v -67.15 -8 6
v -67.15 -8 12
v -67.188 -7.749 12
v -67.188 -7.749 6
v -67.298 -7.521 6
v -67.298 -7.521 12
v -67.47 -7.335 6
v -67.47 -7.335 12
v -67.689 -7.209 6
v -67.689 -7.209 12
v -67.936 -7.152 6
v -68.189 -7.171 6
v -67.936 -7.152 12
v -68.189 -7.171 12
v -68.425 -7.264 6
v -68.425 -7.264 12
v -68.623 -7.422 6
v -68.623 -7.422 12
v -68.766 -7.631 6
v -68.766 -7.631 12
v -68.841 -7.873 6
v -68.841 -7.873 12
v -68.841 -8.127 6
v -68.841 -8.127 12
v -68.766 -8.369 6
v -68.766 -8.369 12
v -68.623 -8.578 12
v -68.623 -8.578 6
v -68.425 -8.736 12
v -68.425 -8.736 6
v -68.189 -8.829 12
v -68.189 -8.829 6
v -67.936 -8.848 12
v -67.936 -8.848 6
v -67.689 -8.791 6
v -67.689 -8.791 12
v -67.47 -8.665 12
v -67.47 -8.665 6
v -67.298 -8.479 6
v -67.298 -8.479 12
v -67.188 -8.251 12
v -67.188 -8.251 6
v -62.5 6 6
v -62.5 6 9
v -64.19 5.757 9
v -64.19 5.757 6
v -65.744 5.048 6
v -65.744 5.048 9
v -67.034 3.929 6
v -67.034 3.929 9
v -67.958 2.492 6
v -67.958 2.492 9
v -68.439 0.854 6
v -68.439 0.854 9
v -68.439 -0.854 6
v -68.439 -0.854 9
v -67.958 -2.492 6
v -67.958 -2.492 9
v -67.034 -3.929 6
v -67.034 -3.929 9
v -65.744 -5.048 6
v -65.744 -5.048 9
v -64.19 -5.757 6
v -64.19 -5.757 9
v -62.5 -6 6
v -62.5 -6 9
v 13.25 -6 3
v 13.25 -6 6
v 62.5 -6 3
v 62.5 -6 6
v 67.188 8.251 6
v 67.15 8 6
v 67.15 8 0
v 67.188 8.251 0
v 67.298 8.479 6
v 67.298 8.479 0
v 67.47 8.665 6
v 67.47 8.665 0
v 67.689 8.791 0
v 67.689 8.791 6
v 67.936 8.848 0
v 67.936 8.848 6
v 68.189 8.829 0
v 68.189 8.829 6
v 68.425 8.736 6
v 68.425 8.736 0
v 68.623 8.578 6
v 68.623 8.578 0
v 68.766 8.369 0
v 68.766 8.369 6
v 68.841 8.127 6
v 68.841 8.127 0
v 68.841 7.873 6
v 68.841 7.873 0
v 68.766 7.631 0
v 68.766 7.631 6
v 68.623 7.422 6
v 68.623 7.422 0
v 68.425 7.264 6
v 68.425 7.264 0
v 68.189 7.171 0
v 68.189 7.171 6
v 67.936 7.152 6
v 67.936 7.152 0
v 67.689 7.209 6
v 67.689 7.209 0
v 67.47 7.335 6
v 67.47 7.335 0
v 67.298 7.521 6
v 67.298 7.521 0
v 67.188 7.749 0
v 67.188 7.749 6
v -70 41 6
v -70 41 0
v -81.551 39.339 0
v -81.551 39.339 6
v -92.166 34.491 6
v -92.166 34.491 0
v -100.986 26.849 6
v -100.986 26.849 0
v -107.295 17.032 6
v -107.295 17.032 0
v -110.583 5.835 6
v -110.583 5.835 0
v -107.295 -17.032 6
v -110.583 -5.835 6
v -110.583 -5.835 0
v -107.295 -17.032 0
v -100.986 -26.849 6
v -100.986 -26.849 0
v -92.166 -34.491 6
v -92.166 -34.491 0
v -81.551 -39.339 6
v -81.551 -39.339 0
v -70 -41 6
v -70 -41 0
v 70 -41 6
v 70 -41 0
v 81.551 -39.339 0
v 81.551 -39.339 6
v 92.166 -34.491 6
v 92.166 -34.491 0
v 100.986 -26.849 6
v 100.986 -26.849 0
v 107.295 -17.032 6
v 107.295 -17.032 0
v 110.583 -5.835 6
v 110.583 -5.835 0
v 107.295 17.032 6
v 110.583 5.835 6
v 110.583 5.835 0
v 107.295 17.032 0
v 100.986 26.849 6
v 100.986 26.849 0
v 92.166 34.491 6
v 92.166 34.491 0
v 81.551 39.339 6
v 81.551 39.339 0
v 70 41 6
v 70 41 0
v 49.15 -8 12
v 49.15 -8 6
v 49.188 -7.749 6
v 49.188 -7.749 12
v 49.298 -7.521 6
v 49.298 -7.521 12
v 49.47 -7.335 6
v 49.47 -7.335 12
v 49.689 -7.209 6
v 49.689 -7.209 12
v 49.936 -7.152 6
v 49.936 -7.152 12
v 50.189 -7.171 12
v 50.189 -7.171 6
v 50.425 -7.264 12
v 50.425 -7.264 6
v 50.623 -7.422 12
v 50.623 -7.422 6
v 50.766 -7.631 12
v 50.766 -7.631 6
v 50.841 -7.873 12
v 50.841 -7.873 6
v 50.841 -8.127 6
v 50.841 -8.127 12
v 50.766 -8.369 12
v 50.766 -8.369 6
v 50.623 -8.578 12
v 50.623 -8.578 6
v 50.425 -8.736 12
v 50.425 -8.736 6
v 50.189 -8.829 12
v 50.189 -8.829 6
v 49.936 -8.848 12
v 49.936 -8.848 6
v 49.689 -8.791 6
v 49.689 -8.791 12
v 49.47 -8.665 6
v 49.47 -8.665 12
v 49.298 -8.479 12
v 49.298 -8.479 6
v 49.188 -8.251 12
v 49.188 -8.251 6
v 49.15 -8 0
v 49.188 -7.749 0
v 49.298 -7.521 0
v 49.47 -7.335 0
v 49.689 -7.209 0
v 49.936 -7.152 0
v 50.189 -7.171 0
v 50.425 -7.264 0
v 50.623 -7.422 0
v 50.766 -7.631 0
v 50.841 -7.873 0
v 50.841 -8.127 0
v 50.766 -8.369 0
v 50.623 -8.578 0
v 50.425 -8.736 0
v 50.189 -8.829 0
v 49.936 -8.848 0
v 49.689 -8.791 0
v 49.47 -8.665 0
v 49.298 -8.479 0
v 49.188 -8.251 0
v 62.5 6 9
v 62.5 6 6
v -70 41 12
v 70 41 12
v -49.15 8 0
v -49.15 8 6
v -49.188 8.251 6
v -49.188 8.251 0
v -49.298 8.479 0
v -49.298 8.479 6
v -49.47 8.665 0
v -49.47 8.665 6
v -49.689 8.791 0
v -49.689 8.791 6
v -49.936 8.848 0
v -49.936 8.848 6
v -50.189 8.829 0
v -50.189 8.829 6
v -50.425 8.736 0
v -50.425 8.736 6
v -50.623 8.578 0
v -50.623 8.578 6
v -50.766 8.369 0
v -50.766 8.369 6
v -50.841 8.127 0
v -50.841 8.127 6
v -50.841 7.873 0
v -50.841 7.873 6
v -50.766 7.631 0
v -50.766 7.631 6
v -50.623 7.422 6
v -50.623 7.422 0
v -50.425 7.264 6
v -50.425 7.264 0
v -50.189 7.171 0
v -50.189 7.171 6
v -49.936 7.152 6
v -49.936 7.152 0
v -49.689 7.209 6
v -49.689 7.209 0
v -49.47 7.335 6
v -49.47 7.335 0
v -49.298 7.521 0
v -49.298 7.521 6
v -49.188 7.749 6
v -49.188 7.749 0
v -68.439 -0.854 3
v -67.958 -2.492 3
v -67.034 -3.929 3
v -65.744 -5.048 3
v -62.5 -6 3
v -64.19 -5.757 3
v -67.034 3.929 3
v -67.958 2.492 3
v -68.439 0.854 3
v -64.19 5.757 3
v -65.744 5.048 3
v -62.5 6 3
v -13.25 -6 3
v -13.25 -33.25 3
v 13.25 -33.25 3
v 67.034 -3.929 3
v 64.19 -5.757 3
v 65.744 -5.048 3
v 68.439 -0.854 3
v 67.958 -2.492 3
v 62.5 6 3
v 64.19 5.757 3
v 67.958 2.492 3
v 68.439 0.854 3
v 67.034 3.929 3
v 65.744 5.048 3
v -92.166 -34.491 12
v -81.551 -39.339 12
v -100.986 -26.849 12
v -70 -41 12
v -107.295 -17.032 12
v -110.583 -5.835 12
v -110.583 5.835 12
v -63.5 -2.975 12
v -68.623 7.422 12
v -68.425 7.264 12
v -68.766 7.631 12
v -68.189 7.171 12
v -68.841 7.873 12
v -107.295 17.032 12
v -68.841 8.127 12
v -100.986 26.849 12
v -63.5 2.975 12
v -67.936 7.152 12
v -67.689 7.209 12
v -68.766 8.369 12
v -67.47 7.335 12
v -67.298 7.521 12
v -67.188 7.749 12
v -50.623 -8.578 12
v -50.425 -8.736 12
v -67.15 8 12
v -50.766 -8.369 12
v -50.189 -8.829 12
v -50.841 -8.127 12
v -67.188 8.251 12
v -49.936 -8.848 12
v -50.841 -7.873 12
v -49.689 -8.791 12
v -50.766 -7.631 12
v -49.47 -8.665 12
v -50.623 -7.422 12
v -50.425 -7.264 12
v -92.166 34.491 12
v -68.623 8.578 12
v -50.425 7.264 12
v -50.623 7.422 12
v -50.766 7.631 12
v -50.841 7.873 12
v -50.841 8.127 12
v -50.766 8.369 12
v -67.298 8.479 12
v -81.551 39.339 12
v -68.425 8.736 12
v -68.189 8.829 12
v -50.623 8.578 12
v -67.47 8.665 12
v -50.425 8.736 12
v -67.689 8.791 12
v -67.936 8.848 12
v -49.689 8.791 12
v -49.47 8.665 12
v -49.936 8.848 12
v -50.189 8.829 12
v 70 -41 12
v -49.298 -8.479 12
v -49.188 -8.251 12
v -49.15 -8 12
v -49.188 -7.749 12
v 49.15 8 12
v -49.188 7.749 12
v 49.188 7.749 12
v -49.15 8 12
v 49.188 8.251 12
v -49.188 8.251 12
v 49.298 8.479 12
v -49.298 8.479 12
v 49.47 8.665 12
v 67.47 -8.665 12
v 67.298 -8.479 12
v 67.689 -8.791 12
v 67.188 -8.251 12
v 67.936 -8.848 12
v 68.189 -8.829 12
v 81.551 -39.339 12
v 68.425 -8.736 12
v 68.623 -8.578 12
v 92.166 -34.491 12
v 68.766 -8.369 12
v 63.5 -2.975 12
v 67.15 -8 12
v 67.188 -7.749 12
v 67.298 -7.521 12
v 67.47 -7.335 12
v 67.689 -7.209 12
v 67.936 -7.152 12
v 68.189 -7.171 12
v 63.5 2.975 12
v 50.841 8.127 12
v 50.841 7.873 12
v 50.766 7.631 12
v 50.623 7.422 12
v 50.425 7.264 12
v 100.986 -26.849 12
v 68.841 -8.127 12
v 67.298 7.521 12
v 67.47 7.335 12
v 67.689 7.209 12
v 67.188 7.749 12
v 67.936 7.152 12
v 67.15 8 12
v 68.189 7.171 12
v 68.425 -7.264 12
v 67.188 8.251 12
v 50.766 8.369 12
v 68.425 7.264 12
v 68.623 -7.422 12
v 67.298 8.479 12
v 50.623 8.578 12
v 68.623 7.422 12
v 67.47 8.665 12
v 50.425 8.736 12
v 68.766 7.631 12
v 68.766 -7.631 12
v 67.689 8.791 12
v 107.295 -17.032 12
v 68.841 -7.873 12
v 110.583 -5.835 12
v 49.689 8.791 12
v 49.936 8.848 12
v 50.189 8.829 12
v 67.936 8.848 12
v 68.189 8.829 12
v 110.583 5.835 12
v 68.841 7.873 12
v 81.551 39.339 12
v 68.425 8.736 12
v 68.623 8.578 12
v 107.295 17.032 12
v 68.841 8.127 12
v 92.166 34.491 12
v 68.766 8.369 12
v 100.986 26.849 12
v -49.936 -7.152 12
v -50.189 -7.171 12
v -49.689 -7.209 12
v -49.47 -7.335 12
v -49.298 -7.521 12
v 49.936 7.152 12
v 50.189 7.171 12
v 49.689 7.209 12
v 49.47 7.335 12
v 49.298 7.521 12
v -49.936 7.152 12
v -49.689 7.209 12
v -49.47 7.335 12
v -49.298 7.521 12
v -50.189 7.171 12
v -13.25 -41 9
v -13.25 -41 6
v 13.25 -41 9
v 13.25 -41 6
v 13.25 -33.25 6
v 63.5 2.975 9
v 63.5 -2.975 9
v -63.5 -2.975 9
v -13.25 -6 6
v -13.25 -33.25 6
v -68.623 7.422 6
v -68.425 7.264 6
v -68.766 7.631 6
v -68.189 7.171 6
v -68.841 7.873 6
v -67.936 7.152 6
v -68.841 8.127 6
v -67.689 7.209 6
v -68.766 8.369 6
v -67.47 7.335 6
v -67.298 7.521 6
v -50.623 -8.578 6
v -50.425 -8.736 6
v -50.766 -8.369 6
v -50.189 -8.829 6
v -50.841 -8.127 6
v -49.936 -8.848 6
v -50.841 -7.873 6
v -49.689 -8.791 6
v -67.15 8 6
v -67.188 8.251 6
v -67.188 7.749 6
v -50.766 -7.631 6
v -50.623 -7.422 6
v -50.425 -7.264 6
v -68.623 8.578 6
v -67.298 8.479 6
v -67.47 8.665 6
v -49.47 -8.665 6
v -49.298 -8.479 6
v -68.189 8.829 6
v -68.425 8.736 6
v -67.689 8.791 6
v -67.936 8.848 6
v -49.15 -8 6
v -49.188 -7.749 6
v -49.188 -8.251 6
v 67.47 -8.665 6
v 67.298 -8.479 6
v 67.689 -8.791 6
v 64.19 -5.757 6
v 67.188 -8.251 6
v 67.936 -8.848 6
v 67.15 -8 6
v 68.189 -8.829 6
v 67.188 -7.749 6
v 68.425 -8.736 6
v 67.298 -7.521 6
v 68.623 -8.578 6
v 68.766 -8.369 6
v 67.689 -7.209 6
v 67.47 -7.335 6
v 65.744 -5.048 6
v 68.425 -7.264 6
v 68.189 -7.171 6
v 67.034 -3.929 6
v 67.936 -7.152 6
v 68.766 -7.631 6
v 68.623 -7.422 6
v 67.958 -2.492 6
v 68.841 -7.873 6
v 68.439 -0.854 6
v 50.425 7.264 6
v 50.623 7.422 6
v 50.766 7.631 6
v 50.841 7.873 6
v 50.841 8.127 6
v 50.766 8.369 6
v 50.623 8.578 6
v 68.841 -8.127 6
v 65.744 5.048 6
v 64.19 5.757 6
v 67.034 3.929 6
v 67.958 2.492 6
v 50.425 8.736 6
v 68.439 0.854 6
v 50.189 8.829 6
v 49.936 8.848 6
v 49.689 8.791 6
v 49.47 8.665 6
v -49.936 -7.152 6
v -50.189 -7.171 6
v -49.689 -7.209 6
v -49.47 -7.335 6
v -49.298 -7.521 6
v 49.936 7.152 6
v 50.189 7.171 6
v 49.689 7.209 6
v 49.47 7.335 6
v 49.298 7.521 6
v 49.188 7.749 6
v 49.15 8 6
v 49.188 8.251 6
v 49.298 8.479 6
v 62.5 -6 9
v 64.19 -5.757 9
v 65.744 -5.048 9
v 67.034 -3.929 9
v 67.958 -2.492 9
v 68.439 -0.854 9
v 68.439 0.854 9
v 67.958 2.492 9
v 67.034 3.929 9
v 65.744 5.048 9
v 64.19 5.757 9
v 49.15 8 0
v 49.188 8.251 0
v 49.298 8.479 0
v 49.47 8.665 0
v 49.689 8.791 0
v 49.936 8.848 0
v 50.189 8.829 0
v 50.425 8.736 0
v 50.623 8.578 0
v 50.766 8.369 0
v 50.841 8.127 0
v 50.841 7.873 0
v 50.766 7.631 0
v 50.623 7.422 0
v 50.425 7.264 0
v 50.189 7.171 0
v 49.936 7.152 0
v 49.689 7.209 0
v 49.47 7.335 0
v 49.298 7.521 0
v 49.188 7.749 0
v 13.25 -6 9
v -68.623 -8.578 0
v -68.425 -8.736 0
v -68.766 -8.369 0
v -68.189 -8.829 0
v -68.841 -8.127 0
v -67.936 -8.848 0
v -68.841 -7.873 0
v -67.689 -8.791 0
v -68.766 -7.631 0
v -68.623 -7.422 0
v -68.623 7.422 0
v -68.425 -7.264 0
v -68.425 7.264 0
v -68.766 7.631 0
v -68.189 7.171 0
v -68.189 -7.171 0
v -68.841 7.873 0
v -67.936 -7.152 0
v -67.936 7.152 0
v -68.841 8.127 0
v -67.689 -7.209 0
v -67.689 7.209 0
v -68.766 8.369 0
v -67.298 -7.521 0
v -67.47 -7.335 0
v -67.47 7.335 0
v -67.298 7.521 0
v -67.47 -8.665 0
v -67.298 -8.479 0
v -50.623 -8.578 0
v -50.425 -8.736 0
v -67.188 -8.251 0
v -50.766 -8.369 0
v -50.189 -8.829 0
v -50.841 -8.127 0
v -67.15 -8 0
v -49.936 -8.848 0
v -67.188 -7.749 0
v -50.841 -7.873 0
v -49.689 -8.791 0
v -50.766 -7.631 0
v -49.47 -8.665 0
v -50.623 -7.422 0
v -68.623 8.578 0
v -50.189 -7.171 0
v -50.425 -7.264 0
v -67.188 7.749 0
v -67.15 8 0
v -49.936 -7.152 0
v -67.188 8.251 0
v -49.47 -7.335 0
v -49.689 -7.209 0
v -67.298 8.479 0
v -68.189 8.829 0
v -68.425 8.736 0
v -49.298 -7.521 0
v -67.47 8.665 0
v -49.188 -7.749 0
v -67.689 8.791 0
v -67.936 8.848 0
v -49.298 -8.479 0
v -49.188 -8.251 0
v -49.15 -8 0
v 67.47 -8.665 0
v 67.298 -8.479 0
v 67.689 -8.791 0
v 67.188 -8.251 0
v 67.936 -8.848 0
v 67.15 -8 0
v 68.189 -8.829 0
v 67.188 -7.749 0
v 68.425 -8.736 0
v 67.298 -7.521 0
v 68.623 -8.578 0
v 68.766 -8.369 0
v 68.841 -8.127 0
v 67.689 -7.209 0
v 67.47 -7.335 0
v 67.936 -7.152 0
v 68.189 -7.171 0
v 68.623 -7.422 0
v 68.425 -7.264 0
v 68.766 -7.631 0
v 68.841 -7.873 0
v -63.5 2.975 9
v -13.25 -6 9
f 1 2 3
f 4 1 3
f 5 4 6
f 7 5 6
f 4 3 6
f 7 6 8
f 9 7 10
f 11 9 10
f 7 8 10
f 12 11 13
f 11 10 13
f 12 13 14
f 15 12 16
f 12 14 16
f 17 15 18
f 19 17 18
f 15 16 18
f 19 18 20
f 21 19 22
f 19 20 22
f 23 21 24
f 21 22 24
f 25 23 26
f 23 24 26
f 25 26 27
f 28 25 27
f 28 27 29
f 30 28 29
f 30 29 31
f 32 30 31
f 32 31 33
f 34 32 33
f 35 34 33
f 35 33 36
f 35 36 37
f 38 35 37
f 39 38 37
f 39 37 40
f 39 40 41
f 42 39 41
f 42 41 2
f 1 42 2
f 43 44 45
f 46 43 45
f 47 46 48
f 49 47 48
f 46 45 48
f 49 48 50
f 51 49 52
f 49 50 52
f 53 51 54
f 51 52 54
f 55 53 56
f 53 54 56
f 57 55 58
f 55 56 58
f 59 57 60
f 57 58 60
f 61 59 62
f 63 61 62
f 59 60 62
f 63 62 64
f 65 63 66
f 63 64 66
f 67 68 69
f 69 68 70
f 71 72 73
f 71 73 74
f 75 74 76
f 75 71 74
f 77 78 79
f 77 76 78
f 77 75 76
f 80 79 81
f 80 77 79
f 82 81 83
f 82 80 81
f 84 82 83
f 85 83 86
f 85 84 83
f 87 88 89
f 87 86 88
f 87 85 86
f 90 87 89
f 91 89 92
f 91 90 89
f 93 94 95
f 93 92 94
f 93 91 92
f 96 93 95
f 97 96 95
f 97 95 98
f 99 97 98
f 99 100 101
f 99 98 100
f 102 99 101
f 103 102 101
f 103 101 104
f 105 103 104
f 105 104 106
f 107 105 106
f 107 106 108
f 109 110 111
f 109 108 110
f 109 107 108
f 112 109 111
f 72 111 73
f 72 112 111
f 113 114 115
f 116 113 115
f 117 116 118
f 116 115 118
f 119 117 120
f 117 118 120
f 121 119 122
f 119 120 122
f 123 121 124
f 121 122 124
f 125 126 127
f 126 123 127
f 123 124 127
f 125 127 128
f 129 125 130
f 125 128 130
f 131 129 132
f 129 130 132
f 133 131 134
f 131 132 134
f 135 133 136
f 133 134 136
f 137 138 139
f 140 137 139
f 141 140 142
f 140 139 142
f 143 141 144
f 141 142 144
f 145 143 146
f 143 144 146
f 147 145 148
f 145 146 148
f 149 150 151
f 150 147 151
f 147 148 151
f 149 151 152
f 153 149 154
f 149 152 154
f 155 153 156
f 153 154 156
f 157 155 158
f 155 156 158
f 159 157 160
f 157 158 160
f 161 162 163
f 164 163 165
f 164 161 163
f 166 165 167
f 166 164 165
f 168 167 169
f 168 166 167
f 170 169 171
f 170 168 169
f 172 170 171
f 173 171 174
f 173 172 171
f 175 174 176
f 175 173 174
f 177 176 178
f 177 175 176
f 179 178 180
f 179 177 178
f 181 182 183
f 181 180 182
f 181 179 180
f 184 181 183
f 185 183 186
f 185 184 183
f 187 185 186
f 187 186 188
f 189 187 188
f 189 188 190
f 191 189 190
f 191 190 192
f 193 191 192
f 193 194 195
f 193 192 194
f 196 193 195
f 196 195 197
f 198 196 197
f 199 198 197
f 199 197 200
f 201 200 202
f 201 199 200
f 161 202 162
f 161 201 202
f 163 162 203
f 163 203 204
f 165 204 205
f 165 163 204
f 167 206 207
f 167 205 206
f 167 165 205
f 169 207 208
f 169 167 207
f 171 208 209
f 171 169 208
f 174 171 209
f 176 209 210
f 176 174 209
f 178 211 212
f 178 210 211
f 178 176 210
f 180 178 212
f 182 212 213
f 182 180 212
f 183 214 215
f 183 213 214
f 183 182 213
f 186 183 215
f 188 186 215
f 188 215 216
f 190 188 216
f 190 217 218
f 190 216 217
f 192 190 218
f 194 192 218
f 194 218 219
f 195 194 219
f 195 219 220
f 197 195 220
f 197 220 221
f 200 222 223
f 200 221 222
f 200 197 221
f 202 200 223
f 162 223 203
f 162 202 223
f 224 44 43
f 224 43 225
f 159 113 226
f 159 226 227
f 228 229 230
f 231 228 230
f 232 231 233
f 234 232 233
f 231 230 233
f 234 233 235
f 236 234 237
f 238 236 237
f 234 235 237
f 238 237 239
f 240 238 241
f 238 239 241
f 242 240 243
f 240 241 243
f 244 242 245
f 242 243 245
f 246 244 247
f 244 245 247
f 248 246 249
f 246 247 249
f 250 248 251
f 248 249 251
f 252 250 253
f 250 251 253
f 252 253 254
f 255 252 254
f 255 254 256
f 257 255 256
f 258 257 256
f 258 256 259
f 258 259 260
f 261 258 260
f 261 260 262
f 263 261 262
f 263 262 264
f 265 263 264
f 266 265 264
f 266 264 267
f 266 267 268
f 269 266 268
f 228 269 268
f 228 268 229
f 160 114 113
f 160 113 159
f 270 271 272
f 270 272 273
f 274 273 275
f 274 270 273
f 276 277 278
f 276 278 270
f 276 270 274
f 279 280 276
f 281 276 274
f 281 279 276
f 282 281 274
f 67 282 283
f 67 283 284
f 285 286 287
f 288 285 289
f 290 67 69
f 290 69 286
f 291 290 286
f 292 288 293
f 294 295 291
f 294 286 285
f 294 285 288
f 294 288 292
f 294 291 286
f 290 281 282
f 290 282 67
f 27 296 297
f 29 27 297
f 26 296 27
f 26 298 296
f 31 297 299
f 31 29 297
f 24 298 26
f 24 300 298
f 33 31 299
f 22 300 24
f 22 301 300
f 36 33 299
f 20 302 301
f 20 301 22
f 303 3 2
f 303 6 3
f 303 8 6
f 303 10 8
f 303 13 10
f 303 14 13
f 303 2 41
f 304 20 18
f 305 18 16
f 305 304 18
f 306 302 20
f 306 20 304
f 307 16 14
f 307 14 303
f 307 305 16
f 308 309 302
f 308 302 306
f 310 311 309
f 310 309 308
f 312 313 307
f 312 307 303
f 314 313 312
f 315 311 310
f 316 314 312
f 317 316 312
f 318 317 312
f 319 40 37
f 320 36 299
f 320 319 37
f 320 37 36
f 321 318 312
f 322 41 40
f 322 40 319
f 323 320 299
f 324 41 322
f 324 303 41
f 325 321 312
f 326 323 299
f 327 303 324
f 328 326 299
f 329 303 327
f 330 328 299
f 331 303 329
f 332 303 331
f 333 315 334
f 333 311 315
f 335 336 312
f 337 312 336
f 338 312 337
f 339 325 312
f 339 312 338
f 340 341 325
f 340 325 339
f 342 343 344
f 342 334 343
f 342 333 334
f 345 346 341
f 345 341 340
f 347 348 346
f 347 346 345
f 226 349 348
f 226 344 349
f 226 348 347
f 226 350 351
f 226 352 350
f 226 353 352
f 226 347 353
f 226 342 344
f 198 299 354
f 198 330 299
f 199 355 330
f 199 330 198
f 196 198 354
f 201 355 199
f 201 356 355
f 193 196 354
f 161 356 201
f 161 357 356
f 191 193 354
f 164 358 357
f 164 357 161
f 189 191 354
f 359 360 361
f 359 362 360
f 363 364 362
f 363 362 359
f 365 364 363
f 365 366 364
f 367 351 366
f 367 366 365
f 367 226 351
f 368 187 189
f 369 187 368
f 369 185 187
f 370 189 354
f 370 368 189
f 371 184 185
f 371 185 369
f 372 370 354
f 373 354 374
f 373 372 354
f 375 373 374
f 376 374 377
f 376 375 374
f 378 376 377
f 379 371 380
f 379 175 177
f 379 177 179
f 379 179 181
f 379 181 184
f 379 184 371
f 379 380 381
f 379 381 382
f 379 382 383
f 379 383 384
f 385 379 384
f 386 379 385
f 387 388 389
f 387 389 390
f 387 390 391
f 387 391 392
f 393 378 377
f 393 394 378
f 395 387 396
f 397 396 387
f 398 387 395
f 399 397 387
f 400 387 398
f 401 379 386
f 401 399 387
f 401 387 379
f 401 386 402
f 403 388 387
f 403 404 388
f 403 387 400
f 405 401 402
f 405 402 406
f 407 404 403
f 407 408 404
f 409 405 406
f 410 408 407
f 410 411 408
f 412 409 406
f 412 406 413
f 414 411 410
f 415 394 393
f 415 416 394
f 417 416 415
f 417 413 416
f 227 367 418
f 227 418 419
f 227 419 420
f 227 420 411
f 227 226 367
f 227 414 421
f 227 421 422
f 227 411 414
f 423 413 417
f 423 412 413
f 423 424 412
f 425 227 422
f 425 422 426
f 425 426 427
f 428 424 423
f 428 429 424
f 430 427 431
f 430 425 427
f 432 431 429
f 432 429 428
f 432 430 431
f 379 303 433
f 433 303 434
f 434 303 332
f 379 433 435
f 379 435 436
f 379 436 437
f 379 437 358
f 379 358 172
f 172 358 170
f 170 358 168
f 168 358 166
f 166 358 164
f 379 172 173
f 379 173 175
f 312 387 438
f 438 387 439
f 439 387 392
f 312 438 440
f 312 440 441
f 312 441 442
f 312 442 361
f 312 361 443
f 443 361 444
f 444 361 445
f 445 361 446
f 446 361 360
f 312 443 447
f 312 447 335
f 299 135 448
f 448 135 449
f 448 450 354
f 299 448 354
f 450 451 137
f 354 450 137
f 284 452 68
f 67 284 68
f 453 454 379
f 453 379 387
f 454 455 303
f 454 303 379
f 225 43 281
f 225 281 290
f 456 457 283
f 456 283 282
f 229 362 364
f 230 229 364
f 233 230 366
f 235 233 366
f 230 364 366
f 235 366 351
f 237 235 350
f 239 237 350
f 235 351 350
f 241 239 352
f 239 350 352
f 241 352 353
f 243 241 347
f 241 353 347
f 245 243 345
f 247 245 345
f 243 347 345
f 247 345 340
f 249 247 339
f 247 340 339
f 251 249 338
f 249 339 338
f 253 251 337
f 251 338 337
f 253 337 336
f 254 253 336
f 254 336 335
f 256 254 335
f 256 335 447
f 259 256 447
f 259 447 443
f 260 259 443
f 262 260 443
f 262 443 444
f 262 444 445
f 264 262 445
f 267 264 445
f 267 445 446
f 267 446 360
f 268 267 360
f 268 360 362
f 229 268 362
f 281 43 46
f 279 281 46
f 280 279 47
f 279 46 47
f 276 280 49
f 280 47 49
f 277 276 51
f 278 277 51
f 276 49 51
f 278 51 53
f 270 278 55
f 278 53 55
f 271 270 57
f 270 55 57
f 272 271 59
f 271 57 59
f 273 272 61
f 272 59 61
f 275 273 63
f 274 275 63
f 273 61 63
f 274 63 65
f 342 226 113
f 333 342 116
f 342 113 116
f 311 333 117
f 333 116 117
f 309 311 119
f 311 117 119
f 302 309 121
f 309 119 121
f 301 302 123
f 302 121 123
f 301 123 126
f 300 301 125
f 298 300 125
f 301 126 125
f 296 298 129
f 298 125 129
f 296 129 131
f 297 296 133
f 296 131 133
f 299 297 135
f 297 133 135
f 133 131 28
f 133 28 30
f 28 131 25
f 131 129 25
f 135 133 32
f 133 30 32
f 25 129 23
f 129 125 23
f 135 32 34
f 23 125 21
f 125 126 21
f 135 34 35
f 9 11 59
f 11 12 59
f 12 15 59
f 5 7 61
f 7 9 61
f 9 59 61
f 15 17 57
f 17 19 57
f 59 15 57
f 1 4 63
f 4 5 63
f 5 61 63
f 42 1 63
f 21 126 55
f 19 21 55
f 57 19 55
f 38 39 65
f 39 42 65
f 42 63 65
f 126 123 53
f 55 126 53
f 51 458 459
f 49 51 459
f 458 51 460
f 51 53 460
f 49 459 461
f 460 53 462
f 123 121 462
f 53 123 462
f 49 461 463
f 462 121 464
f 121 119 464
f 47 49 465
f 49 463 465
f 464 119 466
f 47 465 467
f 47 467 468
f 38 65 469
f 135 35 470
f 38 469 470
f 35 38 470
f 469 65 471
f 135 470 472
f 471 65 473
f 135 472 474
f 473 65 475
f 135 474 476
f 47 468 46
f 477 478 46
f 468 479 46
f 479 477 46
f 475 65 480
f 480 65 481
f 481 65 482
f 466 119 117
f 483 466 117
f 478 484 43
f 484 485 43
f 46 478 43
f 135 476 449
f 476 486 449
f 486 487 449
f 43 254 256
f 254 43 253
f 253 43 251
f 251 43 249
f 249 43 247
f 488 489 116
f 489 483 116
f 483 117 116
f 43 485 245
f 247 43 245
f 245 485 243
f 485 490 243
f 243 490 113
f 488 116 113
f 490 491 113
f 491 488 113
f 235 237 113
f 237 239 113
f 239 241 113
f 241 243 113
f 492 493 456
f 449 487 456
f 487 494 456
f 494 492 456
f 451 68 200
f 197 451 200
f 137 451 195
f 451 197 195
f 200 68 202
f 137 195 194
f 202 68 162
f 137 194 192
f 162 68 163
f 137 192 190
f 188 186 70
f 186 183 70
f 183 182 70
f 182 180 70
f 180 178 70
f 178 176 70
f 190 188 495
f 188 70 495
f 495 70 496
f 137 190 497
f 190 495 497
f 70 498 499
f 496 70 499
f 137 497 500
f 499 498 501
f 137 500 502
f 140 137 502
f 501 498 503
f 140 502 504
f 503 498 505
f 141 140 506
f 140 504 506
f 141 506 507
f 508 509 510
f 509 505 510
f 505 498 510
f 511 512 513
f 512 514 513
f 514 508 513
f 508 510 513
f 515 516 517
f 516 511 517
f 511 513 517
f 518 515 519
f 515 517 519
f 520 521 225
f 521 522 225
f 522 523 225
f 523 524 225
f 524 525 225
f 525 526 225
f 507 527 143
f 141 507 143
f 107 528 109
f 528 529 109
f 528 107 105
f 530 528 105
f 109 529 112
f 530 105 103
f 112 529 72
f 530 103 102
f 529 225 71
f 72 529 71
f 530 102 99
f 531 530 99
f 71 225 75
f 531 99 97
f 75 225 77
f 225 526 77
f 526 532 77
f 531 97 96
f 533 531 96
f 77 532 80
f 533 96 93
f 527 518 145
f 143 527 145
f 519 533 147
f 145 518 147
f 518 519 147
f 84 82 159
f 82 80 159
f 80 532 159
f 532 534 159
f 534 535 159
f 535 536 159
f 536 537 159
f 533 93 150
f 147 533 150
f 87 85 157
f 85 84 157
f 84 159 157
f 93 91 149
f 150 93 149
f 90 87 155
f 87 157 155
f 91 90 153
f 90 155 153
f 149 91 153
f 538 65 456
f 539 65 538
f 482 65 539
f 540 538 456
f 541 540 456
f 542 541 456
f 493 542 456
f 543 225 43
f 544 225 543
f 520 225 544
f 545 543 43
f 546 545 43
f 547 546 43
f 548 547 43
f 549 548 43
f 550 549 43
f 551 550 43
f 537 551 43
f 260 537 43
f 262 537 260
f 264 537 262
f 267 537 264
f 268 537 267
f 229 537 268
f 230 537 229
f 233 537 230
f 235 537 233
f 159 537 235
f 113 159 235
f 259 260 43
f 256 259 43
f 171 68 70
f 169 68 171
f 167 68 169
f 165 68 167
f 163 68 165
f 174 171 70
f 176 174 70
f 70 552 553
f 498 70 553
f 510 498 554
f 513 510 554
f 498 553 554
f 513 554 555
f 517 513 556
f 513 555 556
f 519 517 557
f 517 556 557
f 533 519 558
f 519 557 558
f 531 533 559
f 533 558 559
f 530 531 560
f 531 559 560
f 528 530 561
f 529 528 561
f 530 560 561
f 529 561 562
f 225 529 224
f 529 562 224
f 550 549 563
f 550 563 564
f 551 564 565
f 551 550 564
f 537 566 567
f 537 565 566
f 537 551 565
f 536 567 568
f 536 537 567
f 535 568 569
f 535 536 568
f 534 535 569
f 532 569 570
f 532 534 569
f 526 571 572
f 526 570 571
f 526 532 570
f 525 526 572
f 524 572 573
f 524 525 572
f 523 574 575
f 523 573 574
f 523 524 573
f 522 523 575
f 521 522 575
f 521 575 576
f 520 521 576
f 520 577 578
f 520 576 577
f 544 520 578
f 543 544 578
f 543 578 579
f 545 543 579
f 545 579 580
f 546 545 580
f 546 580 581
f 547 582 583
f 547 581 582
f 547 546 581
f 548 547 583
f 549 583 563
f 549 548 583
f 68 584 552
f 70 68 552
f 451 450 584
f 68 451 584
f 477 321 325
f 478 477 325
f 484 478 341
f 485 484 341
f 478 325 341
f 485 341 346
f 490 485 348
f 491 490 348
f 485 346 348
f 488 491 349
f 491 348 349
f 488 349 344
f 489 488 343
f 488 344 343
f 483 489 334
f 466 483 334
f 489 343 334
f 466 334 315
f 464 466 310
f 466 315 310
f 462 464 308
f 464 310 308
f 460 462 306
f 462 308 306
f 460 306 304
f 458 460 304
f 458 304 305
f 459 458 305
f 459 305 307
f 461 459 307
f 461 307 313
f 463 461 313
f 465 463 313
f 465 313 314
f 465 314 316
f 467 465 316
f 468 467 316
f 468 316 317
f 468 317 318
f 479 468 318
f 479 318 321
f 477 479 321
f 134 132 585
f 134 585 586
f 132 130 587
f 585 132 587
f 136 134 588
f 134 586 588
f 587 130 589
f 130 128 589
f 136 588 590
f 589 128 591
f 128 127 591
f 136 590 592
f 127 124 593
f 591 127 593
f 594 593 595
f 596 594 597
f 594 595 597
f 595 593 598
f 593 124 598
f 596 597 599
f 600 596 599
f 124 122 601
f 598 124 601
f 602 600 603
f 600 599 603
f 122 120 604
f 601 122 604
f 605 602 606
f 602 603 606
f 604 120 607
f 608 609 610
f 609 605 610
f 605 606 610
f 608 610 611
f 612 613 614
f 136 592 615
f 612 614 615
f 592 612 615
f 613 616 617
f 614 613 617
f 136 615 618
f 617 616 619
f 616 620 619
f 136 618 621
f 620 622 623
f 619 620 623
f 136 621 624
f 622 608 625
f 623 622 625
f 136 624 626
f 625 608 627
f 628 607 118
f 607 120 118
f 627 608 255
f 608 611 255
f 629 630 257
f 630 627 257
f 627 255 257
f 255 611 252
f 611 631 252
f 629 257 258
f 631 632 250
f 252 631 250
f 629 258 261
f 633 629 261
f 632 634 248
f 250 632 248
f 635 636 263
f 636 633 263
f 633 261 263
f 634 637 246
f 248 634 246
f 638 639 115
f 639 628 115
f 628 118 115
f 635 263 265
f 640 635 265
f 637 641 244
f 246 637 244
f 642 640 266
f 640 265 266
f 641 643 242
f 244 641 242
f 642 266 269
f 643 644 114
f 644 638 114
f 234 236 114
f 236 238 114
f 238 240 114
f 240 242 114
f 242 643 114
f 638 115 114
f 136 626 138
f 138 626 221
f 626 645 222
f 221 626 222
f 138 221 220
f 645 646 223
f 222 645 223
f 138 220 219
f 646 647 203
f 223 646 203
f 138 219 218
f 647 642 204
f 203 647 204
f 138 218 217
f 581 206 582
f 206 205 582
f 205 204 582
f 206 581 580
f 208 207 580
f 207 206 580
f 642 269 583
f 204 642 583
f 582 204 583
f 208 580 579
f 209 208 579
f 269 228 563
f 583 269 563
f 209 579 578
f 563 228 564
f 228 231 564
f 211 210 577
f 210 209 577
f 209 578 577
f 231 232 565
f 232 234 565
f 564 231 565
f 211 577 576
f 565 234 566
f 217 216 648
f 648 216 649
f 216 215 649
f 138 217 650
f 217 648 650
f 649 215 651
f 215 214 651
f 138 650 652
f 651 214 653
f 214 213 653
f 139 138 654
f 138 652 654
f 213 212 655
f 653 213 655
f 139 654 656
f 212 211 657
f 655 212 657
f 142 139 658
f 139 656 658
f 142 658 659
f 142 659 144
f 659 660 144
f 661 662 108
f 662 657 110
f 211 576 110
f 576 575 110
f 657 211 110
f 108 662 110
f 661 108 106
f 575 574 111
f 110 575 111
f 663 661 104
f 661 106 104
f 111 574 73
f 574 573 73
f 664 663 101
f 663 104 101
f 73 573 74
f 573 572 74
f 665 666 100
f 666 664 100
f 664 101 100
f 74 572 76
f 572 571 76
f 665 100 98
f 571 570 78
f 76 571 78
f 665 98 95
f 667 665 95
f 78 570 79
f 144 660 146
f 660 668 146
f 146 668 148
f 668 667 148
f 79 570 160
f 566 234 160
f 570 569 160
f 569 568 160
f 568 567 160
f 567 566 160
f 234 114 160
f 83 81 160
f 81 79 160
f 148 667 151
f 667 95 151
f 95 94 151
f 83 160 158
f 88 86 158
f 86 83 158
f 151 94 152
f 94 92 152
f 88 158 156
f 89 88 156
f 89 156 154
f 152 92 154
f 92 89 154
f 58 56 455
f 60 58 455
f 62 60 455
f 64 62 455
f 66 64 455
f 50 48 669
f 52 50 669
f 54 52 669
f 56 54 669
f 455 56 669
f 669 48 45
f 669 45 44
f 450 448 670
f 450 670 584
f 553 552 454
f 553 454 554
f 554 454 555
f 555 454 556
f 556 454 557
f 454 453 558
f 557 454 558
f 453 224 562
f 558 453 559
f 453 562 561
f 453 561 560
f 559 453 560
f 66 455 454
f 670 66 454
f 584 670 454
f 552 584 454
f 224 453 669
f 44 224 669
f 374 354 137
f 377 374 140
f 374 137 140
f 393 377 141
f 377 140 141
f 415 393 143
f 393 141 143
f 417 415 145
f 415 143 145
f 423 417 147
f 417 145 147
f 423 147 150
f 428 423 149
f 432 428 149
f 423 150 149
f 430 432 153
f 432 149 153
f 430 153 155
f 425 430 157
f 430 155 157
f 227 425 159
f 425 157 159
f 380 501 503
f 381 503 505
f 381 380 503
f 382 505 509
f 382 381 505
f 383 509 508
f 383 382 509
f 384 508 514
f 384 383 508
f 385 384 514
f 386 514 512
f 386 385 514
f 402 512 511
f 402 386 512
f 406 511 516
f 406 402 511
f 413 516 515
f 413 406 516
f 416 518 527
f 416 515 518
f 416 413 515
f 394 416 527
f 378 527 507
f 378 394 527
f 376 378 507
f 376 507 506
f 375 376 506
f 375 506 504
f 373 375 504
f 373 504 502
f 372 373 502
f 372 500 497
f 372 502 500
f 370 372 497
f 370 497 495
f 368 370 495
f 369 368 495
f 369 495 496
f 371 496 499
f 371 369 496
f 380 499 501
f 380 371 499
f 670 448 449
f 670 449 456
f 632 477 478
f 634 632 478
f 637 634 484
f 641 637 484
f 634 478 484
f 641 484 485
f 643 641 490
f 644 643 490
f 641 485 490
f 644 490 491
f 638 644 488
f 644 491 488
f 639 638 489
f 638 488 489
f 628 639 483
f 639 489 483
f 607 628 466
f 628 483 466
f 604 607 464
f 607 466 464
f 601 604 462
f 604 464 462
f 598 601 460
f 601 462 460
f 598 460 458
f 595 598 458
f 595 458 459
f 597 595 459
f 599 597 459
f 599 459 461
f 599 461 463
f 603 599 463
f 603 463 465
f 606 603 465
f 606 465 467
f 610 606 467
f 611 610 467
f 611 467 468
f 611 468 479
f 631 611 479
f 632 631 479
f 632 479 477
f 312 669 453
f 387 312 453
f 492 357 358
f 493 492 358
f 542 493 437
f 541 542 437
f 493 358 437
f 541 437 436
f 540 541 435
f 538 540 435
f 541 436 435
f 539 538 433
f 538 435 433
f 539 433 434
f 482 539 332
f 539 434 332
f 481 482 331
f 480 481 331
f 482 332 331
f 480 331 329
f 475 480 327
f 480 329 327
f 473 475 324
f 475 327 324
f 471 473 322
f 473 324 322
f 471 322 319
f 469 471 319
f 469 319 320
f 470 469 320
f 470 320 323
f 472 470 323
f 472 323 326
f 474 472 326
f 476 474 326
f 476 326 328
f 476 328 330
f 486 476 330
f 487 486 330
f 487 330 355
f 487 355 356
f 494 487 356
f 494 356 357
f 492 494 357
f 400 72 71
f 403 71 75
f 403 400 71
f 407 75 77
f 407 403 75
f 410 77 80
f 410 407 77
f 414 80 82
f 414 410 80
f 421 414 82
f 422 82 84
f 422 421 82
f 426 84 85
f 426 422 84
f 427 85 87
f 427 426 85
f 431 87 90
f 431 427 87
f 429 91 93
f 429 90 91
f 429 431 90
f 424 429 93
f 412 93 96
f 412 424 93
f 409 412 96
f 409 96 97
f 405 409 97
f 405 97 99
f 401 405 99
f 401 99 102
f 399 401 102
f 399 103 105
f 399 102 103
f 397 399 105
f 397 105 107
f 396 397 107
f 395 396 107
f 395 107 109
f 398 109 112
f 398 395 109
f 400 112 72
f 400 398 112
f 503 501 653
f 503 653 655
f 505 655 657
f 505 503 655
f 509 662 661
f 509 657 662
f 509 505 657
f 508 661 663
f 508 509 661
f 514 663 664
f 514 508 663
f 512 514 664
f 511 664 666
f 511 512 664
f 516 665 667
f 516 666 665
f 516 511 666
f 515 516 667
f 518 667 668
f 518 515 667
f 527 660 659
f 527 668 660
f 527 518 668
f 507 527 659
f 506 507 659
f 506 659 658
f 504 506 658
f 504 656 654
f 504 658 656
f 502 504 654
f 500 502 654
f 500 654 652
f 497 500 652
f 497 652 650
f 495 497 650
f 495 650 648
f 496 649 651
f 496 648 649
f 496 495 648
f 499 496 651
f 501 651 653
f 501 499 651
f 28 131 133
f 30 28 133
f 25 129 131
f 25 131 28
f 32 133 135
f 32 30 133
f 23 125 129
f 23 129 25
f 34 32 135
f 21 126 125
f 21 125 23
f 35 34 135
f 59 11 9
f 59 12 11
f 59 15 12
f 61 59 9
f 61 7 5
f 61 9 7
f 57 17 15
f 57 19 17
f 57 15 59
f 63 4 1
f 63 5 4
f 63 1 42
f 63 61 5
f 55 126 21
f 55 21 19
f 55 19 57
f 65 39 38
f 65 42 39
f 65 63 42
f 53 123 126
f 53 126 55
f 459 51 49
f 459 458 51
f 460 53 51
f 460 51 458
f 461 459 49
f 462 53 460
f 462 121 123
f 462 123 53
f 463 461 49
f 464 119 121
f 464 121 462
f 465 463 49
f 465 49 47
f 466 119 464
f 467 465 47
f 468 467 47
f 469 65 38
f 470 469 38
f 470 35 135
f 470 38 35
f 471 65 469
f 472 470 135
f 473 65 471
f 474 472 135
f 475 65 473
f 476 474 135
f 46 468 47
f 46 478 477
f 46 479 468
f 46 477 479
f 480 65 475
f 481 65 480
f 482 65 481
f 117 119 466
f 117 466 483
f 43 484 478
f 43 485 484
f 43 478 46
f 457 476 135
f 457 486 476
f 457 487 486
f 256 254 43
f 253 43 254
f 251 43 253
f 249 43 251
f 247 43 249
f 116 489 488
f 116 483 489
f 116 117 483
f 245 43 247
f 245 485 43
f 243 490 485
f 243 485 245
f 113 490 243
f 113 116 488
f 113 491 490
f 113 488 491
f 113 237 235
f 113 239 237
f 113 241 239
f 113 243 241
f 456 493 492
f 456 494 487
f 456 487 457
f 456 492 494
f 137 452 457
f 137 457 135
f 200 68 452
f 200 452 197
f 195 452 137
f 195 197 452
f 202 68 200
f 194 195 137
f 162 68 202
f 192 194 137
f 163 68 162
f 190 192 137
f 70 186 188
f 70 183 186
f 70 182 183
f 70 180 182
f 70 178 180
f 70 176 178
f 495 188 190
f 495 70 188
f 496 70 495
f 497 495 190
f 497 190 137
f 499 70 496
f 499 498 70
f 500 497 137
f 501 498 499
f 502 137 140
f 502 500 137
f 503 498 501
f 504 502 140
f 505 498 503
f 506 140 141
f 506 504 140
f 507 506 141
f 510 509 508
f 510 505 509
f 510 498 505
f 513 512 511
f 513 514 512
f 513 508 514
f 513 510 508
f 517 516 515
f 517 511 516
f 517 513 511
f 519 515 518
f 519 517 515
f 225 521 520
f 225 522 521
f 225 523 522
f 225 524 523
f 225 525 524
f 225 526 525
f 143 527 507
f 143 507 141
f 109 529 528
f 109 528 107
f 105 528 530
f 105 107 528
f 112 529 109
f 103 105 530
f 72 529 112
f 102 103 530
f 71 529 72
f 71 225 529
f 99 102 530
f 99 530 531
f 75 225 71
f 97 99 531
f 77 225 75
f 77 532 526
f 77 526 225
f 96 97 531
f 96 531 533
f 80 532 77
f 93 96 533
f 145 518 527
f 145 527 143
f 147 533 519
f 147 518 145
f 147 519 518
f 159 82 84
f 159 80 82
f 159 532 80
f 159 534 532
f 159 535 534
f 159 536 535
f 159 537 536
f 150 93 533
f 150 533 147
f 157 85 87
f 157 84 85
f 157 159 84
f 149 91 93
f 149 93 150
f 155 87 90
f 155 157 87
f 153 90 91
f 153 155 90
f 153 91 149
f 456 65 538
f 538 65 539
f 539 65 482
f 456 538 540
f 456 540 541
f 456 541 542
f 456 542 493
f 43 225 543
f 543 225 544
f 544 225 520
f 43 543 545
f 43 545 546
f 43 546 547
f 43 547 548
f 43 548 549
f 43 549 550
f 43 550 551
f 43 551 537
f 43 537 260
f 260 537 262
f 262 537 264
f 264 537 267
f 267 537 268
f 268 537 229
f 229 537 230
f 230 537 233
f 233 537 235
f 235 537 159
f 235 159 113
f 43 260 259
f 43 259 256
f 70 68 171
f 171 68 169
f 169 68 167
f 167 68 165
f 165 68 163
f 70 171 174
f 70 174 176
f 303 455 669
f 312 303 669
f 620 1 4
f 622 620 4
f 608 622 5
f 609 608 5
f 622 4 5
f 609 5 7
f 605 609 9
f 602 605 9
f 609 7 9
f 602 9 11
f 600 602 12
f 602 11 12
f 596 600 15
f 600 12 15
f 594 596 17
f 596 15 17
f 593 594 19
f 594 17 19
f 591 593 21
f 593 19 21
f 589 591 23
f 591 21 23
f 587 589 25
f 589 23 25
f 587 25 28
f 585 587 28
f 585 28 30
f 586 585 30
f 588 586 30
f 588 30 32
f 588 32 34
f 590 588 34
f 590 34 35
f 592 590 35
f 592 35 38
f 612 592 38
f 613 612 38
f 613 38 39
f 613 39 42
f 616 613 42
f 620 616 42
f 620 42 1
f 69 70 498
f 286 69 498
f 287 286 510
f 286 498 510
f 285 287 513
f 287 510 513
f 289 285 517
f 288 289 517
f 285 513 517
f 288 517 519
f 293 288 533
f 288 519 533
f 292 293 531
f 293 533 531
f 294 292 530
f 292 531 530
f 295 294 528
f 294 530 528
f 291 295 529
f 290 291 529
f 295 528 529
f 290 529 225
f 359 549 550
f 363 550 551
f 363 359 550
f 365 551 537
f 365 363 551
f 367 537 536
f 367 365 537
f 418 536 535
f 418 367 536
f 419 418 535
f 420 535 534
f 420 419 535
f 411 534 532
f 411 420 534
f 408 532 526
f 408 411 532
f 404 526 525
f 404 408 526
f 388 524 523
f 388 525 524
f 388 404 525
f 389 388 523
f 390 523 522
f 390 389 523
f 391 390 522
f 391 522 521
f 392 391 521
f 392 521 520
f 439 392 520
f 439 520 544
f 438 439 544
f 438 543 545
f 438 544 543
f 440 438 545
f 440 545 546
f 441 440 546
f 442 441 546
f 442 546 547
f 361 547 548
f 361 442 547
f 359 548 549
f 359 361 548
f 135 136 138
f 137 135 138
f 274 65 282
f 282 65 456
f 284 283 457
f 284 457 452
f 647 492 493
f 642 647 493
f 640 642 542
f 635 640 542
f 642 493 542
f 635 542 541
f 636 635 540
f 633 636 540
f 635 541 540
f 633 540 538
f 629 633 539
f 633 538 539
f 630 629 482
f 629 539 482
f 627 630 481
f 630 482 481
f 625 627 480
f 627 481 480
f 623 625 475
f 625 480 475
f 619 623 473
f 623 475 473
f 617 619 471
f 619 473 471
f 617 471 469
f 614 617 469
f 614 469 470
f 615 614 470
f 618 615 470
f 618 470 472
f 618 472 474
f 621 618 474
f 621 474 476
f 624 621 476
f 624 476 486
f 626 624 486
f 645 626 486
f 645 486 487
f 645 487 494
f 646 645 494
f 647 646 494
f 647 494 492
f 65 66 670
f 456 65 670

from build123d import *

# Parameters (mm, degrees)
BOX_BOTTOM_HALF_0_W     = 224
BOX_BOTTOM_HALF_0_H     = 84
BOX_BOTTOM_HALF_0_DEPTH = 7
PAD_DEPTH               = 9
POCKET_DEPTH            = 6
SKETCH002_W             = 26.5
SKETCH002_H             = 35
POCKET001_DEPTH         = 6
SKETCH003_W             = 127
SKETCH003_H             = 5.95
PAD001_DEPTH            = 3
SKETCH004_R             = 0.85
POCKET002_DEPTH         = 485.929265
SKETCH005_W             = 26.5
SKETCH005_H             = 7.75
PAD002_DEPTH            = 3


with BuildPart() as box_bottom_half_0_body:
    # box_bottom_half_0 → box_bottom_half_0 (new body)
    with BuildSketch(Plane(origin=(-112, -42, -1), x_dir=(1, 0, 0), z_dir=(0, 0, 1))):
        with Locations((112, 42)):
            Rectangle(BOX_BOTTOM_HALF_0_W, BOX_BOTTOM_HALF_0_H)
    extrude(amount=BOX_BOTTOM_HALF_0_DEPTH)


with BuildPart() as body:
    # Sketch → Pad (new body)
    with BuildSketch(Plane.XY):
        with BuildLine():
            ThreePointArc((-70, 41), (-111, 0), (-70, -41))
            Line((-70, -41), (70, -41))
            ThreePointArc((70, -41), (111, 0), (70, 41))
            Line((-70, 41), (70, 41))
        make_face()
    extrude(amount=PAD_DEPTH)

    # Sketch001 (on Face6 of Pad) → Pocket (cut)
    with BuildSketch(Plane.XY.offset(9)):
        with BuildLine():
            ThreePointArc((-62.5, 6), (-68.5, 0), (-62.5, -6))
            Line((-62.5, -6), (62.5, -6))
            ThreePointArc((62.5, -6), (68.5, 0), (62.5, 6))
            Line((-62.5, 6), (62.5, 6))
        make_face()
    extrude(amount=-POCKET_DEPTH, mode=Mode.SUBTRACT)

    # Sketch002 (on Face5 of Pocket) → Pocket001 (cut)
    with BuildSketch(Plane.XY.offset(9)):
        with Locations((0, -23.5)):
            Rectangle(SKETCH002_W, SKETCH002_H)
    extrude(amount=-POCKET001_DEPTH, mode=Mode.SUBTRACT)

    # Sketch003 (on Face5 of Pocket001) → Pad001 (join)
    with BuildSketch(Plane.XY.offset(9)):
        with BuildLine():
            ThreePointArc((-70, 41), (-111, 0), (-70, -41))
            Line((-70, -41), (70, -41))
            ThreePointArc((70, -41), (111, 0), (70, 41))
            Line((-70, 41), (70, 41))
        make_face()
        Rectangle(SKETCH003_W, SKETCH003_H, mode=Mode.SUBTRACT)
    extrude(amount=PAD001_DEPTH)

    # Sketch004 (on Face12 of Pad001) → Pocket002 (cut, through all)
    with BuildSketch(Plane.XY.offset(12)):
        with Locations((-68, -8)):
            Circle(SKETCH004_R)
        with Locations((-50, -8)):
            Circle(SKETCH004_R)
        with Locations((-50, 8)):
            Circle(SKETCH004_R)
        with Locations((-68, 8)):
            Circle(SKETCH004_R)
    pocket002 = extrude(amount=-POCKET002_DEPTH, mode=Mode.SUBTRACT)

    # Sketch005 (on Face10 of Pocket002) → Pad002 (join)
    with BuildSketch(Plane.XY.offset(3)):
        with Locations((0, -37.125)):
            Rectangle(SKETCH005_W, SKETCH005_H)
    extrude(amount=PAD002_DEPTH)

    # Mirrored: Pocket002 across Sketch004 V_Axis
    add(pocket002.mirror(Plane(origin=(0, 0, 12), x_dir=(0, 0, 1), z_dir=(1, 0, 0))), mode=Mode.SUBTRACT)


with BuildPart() as bottom_half_0_body:
    # bottom_half_0 base: copy of Body
    add(body.part)

    # bottom_half_0: intersect box_bottom_half_0 body
    add(box_bottom_half_0_body.part, mode=Mode.INTERSECT)


with BuildPart() as top_half_0_body:
    # top_half_0 base: copy of Body
    add(body.part)

    # top_half_0: cut box_bottom_half_0 body
    add(box_bottom_half_0_body.part, mode=Mode.SUBTRACT)


solid = Compound([bottom_half_0_body.part, top_half_0_body.part])
